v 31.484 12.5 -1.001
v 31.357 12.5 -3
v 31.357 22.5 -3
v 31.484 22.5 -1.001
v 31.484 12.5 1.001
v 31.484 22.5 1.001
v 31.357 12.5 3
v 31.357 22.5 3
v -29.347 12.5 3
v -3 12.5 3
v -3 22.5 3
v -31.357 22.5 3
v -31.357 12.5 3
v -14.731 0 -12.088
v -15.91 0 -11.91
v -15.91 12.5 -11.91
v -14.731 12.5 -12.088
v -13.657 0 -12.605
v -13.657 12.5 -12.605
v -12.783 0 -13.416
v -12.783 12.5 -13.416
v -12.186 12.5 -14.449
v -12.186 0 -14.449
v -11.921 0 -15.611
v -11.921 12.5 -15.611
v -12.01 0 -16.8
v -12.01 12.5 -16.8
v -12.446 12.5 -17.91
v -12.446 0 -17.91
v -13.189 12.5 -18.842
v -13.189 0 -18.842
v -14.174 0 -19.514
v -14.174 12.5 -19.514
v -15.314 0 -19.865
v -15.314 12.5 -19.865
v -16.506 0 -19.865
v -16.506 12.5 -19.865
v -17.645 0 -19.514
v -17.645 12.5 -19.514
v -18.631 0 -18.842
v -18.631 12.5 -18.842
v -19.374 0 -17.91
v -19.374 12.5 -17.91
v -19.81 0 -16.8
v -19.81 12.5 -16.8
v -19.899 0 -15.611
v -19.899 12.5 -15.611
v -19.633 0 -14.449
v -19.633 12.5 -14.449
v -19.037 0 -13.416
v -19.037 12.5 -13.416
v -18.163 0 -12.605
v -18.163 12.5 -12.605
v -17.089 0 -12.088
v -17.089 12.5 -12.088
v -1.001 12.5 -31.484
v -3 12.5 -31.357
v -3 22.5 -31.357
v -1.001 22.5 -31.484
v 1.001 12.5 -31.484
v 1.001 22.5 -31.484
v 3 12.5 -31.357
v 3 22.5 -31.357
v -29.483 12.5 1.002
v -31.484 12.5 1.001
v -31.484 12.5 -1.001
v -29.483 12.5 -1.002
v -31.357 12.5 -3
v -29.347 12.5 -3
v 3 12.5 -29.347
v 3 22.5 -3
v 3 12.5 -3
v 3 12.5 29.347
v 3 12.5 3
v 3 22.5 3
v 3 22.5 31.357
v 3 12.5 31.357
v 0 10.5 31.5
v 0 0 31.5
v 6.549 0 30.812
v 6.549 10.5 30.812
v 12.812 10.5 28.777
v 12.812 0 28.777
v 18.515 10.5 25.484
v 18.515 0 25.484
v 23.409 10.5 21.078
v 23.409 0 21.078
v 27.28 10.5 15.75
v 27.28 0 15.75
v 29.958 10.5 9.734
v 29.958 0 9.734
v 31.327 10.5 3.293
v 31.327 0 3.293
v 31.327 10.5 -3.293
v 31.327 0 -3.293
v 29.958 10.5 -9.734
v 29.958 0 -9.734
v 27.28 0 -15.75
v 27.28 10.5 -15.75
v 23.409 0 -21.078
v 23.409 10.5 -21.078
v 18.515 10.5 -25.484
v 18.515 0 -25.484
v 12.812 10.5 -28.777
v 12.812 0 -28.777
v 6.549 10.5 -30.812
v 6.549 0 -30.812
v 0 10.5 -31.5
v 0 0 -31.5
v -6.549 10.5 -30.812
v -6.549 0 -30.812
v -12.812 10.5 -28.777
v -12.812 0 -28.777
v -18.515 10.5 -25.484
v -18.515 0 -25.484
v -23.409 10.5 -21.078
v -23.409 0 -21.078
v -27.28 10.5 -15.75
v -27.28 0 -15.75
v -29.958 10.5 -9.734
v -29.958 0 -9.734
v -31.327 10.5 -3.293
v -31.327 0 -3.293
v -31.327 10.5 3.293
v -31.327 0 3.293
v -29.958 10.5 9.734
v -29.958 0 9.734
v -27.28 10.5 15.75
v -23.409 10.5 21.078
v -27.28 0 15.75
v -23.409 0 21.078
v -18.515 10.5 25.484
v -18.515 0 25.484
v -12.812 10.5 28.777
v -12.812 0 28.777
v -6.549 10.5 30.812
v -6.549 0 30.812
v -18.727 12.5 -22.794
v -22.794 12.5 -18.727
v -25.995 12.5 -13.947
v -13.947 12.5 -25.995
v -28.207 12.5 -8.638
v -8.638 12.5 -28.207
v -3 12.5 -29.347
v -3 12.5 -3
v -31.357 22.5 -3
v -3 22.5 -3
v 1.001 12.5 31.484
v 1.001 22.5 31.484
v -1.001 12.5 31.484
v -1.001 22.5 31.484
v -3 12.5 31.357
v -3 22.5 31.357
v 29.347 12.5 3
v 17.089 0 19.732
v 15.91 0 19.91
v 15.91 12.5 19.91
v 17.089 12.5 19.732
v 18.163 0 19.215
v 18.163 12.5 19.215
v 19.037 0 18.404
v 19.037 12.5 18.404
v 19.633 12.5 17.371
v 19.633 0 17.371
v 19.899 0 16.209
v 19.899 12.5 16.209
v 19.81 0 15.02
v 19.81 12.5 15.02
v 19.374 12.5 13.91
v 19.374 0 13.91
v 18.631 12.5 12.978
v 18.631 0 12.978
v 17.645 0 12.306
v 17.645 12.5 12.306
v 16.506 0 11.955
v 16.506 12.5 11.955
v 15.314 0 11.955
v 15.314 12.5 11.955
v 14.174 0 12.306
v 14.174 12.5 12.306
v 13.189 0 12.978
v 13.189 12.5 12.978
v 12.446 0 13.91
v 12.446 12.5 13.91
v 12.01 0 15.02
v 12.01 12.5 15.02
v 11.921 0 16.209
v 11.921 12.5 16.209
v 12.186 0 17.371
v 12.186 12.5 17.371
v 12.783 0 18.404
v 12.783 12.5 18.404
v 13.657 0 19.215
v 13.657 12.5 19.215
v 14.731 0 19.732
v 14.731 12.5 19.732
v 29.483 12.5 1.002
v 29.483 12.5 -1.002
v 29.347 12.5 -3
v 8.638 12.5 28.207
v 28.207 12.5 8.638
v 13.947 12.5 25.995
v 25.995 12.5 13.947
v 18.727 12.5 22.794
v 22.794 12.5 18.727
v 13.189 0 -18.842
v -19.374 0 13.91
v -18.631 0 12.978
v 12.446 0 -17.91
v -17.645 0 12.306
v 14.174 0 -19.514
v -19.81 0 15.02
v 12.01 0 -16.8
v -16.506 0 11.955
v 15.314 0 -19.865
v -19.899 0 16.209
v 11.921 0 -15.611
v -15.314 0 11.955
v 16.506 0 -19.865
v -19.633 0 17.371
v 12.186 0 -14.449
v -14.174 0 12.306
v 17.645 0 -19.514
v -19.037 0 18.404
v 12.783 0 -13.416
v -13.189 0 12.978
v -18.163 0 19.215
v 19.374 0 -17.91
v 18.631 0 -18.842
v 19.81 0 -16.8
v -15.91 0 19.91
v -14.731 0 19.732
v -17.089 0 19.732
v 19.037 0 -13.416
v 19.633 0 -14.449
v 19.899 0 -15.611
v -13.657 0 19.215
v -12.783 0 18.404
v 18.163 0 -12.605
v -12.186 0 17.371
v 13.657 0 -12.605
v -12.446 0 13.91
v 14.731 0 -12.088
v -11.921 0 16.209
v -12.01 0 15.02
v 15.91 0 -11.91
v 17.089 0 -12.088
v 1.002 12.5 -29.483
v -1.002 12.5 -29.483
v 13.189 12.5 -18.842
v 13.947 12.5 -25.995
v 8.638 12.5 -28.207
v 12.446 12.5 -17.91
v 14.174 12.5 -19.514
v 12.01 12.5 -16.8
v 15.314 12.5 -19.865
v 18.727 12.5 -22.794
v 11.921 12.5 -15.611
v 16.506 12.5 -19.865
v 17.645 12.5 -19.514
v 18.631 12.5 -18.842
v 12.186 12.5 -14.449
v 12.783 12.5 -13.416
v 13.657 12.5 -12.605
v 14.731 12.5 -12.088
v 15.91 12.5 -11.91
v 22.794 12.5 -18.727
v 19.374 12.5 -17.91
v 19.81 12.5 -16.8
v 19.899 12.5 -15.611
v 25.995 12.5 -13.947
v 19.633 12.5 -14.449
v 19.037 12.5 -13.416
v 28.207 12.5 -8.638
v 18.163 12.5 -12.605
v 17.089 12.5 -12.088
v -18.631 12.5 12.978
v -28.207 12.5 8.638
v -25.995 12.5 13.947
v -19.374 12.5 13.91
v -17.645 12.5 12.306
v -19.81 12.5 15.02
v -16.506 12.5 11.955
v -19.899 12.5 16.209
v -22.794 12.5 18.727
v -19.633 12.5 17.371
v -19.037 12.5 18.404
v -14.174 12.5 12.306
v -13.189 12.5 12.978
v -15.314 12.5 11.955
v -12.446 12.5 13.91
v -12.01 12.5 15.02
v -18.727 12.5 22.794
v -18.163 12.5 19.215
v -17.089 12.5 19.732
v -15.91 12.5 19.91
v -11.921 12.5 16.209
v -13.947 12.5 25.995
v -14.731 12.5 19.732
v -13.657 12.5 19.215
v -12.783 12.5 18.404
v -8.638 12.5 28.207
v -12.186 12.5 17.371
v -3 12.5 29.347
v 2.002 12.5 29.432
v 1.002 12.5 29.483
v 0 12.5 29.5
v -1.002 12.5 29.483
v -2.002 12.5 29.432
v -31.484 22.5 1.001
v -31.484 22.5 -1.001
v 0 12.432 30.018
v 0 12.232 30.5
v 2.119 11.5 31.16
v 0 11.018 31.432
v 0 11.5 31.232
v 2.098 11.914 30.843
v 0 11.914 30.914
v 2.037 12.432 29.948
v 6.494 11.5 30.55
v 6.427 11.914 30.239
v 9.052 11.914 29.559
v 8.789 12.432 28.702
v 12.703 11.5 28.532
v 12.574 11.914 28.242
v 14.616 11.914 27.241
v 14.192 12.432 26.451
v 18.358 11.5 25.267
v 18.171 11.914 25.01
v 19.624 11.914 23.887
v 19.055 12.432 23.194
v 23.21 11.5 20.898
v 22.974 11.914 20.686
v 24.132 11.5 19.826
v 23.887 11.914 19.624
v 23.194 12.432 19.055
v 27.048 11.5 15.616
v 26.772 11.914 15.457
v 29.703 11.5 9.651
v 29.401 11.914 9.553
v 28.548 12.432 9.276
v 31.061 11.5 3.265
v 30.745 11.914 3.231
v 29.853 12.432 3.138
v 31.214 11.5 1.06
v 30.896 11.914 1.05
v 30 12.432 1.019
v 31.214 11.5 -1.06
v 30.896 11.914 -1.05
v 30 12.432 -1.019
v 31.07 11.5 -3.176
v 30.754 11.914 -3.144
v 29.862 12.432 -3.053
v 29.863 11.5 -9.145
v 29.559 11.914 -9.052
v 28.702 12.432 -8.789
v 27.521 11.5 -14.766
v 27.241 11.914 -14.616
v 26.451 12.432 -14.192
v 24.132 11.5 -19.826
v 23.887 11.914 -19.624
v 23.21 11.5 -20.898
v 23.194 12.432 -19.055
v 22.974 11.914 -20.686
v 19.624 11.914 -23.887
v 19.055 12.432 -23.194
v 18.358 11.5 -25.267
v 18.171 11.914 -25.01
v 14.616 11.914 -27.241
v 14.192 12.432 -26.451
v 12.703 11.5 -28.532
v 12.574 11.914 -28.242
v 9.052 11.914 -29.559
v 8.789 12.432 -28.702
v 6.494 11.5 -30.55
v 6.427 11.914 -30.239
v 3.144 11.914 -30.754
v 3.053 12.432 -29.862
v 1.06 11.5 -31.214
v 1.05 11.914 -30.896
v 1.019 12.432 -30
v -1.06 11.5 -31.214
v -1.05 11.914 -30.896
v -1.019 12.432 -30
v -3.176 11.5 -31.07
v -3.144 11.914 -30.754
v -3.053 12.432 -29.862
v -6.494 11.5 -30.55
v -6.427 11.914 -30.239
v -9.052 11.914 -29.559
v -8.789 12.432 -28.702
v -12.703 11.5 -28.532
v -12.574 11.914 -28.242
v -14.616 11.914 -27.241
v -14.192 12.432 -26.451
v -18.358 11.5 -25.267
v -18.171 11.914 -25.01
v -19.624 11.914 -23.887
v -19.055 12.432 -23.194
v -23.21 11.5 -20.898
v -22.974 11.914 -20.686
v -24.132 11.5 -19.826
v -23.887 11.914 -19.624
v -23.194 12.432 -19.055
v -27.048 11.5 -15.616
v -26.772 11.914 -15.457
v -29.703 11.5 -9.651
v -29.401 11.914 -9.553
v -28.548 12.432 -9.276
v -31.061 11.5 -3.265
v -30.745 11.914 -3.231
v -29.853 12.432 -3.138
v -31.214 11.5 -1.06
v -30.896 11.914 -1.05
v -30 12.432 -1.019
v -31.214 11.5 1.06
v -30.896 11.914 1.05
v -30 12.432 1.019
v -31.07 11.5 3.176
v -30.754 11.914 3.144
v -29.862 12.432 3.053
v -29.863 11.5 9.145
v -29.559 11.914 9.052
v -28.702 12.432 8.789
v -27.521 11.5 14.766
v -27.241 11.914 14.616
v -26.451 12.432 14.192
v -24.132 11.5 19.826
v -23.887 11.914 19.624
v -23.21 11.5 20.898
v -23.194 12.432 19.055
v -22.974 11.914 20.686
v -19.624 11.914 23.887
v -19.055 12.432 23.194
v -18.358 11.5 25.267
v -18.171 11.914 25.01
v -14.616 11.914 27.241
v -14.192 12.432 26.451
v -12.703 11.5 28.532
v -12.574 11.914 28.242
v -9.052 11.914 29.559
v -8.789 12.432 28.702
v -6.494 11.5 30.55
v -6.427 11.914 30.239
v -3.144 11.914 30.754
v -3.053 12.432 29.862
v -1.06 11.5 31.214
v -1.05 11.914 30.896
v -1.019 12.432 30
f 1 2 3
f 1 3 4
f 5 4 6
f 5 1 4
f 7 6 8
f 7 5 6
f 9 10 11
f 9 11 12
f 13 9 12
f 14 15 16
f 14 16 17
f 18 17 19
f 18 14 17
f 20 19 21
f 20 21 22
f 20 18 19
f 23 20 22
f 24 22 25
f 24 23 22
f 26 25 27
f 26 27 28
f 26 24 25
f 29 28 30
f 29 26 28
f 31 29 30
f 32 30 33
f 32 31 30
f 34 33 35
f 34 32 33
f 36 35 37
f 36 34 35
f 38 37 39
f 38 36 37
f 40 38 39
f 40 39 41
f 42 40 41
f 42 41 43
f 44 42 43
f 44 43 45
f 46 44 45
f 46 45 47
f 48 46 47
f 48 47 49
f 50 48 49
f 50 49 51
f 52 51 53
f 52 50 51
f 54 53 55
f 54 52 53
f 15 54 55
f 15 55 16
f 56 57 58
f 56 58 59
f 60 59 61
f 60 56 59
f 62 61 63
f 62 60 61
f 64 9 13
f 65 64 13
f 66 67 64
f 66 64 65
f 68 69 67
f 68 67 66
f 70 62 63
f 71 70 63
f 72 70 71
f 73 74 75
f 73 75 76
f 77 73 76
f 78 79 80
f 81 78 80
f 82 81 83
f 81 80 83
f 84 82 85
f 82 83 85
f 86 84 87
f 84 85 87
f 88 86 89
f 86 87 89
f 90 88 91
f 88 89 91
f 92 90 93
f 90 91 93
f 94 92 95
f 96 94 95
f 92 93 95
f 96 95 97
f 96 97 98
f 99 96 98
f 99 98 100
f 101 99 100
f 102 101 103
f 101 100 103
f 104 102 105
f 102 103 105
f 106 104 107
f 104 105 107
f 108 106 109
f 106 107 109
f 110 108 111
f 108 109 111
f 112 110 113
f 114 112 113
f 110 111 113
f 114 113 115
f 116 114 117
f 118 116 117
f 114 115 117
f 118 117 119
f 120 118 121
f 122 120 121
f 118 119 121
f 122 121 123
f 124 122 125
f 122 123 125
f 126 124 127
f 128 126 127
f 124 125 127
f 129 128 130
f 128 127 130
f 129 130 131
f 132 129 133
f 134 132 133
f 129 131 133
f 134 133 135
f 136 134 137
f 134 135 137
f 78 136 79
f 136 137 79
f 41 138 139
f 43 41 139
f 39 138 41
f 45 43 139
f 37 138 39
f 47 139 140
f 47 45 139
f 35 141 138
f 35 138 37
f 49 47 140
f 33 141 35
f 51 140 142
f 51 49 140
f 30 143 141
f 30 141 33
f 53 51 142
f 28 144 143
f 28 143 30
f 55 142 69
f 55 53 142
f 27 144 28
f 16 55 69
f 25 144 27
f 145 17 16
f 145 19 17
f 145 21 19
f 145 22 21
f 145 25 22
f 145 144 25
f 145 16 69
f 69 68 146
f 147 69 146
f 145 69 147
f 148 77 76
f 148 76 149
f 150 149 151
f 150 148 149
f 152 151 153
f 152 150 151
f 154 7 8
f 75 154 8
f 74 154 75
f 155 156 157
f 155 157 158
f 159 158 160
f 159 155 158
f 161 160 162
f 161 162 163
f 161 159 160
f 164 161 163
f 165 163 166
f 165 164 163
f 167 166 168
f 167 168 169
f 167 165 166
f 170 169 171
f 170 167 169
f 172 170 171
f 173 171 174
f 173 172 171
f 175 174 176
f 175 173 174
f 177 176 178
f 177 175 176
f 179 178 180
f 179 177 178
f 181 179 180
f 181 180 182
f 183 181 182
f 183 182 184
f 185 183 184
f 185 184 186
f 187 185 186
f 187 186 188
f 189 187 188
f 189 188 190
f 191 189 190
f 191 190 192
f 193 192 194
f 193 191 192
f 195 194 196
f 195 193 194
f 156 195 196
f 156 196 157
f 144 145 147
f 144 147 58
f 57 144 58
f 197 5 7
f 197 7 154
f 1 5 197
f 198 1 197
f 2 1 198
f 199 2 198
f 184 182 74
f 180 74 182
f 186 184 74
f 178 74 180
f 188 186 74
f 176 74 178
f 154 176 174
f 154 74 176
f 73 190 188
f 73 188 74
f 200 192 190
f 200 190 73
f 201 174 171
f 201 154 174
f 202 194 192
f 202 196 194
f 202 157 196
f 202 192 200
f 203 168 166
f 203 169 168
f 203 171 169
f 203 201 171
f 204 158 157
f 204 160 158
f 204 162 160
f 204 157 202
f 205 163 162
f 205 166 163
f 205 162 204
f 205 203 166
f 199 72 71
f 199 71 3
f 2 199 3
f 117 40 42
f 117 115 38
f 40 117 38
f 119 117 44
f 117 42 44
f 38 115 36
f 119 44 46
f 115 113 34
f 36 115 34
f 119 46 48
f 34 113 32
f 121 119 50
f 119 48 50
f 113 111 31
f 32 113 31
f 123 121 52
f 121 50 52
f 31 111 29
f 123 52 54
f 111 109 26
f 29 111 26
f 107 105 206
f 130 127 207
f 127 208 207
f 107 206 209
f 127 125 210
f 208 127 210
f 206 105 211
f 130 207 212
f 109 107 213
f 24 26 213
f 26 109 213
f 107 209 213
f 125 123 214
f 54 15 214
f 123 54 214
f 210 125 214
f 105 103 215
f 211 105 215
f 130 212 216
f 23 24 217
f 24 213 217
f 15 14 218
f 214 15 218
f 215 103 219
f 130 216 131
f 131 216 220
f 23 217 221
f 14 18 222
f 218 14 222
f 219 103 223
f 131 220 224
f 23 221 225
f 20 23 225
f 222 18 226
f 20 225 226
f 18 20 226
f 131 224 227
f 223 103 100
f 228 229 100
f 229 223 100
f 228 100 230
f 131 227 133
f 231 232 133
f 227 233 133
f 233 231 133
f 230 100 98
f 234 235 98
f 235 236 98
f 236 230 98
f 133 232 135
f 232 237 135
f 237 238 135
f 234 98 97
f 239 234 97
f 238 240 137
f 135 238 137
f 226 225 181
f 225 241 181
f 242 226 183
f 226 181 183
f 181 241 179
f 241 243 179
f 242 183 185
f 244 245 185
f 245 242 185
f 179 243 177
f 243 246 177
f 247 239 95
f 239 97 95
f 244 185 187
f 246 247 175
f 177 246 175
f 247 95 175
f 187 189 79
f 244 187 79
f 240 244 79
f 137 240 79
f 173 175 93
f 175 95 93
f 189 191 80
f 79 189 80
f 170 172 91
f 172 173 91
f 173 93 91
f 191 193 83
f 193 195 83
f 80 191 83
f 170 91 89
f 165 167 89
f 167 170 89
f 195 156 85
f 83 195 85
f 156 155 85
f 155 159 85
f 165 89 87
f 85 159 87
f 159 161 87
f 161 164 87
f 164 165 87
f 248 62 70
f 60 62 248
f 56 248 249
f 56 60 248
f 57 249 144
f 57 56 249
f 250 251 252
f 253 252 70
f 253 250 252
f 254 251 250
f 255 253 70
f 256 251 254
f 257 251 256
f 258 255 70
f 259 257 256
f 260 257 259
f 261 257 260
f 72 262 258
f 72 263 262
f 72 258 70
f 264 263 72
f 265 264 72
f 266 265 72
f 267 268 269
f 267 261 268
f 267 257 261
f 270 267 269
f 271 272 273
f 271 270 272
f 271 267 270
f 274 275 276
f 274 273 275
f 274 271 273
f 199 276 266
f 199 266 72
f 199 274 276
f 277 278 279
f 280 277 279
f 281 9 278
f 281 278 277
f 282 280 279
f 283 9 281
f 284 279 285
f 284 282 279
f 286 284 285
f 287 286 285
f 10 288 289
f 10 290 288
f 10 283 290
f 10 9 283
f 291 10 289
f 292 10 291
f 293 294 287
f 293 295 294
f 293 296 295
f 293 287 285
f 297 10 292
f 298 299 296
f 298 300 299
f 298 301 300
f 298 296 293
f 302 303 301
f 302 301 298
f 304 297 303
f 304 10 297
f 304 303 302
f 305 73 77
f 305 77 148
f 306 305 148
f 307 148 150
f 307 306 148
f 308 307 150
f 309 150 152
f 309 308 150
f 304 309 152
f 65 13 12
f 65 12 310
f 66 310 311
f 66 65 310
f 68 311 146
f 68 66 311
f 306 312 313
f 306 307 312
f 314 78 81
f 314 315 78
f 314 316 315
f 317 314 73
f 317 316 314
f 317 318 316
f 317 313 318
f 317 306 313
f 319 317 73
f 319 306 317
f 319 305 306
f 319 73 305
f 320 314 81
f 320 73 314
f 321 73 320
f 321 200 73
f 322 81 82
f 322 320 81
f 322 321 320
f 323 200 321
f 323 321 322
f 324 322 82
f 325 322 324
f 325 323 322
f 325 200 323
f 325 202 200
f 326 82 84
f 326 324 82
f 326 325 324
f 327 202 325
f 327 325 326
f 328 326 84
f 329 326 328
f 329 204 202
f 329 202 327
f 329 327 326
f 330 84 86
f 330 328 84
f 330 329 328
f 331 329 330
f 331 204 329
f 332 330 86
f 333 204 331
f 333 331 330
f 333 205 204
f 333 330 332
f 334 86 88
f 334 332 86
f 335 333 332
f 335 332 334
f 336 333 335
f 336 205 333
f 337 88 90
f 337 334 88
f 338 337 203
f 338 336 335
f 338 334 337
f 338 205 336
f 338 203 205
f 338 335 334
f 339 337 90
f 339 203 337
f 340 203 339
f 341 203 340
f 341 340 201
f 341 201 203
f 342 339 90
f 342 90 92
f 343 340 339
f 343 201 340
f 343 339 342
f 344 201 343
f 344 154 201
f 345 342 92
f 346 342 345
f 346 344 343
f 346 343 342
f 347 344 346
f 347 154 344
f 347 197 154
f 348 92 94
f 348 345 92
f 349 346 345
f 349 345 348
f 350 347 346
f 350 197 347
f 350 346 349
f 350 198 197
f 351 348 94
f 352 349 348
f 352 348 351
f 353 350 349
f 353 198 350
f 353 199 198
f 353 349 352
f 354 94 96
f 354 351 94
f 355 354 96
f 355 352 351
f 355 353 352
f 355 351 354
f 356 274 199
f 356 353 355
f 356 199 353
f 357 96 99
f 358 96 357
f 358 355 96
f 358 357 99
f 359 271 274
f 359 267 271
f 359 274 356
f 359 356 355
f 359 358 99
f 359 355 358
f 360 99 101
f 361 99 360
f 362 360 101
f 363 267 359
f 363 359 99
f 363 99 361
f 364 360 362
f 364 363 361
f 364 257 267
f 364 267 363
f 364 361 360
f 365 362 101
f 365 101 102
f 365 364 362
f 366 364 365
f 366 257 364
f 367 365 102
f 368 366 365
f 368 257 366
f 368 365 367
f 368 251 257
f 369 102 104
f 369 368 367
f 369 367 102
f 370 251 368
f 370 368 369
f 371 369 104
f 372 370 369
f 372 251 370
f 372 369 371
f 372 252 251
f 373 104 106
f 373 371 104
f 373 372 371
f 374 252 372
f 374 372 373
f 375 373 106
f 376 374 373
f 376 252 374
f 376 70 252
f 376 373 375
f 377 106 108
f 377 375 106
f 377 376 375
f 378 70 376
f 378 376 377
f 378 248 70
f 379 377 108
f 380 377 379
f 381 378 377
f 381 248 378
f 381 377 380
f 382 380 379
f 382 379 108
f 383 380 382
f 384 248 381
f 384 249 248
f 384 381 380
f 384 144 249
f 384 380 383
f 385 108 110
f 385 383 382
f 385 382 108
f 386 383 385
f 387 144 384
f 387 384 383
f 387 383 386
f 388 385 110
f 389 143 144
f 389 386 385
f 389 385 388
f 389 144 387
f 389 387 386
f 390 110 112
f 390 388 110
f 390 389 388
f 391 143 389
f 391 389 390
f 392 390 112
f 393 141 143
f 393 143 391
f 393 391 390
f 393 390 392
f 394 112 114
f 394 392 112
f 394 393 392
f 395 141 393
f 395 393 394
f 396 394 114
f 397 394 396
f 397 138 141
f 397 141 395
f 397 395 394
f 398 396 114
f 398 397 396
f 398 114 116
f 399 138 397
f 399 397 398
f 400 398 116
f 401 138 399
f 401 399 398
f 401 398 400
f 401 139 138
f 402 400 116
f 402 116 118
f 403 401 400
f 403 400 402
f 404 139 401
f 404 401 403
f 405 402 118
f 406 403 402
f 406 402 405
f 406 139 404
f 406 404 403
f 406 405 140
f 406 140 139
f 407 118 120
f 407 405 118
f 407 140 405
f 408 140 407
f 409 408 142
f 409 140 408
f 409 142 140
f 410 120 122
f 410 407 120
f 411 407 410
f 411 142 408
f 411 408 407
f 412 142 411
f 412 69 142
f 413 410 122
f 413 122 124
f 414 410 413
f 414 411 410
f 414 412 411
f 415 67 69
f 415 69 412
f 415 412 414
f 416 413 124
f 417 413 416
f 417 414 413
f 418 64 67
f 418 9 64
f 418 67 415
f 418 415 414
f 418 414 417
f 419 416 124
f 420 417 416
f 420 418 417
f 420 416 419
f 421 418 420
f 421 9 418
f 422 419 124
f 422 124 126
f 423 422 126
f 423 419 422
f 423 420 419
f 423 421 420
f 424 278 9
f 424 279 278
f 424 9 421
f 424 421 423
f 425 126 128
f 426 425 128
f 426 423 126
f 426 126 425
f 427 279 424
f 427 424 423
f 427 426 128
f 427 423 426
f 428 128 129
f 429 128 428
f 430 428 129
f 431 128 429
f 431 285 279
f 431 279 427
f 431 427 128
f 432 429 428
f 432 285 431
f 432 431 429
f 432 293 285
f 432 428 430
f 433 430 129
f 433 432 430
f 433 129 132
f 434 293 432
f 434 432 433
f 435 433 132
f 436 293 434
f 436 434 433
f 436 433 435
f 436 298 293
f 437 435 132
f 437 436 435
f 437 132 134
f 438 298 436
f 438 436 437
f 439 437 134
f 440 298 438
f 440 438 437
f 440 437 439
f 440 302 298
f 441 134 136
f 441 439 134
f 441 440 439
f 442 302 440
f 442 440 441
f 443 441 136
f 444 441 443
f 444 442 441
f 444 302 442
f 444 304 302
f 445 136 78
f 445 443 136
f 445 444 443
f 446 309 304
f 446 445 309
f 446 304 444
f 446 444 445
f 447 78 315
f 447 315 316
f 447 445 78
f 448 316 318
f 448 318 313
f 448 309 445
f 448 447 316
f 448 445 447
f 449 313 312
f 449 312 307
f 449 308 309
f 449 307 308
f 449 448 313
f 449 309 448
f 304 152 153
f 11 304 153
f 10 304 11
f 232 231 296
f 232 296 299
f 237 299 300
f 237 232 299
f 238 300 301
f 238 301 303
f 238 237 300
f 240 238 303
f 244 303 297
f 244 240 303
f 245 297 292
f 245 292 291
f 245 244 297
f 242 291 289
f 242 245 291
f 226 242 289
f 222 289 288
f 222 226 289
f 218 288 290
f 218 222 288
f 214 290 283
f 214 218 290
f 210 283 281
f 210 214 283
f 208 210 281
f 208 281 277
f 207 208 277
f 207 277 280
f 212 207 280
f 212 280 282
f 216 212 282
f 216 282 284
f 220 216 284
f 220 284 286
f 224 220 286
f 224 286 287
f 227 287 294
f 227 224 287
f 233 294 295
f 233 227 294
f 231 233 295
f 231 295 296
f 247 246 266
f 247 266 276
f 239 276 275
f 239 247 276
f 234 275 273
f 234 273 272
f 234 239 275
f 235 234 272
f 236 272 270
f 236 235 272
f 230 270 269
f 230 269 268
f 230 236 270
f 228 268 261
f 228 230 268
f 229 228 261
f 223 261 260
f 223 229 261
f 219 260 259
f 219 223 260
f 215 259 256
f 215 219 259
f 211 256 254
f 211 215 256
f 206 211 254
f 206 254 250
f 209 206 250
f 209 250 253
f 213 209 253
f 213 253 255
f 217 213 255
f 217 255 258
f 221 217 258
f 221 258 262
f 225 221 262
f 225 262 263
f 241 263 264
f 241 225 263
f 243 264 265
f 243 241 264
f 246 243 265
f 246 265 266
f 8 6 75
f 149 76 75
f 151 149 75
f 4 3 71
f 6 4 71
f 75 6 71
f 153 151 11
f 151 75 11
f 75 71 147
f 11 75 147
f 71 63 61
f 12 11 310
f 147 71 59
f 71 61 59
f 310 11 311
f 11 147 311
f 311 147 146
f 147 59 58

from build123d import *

# Parameters (mm, degrees)
SKETCH_1_R      = 31.5
SKETCH_1_R_2    = 4
EXTRUDE_1_DEPTH = 12.5
FILLET_1_R      = 2
EXTRUDE_2_DEPTH = 10


with BuildPart() as part:
    # 草图1 → 凸台-拉伸1 (new body)
    with BuildSketch(Plane(origin=(0, 0, 0), x_dir=(1, 0, 0), z_dir=(0, 1, 0))):
        with Locations(Location((0, 0, 0), (0, 0, 270))):
            Circle(SKETCH_1_R)
        with Locations(Location((-15.909902577, 15.909902577, 0), (0, 0, 270))):
            Circle(SKETCH_1_R_2, mode=Mode.SUBTRACT)
        with Locations(Location((15.909902577, 15.909902577, 0), (0, 0, 270))):
            Circle(SKETCH_1_R_2, mode=Mode.SUBTRACT)
        with Locations(Location((15.909902577, -15.909902577, 0), (0, 0, 270))):
            Circle(SKETCH_1_R_2, mode=Mode.SUBTRACT)
        with Locations(Location((-15.909902577, -15.909902577, 0), (0, 0, 270))):
            Circle(SKETCH_1_R_2, mode=Mode.SUBTRACT)
    extrude(amount=EXTRUDE_1_DEPTH)

    # 圆角1
    fillet_1_edges = [part.edges().sort_by_distance(p)[0] for p in [
        (0, 12.5, -31.5),
    ]]
    fillet(fillet_1_edges, radius=FILLET_1_R)

    # 草图2 → 凸台-拉伸2 (add)
    with BuildSketch(Plane(origin=(0, 12.5, 0), x_dir=(1, 0, 0), z_dir=(0, 1, 0))):
        with BuildLine():
            Line((3, 31.356817441), (3, 3))
            Line((3, 3), (31.356817441, 3))
            ThreePointArc((31.356817441, 3), (31.5, 0), (31.356817441, -3))
            Line((31.356817441, -3), (3, -3))
            Line((3, -3), (3, -31.356817441))
            ThreePointArc((3, -31.356817441), (0, -31.5), (-3, -31.356817441))
            Line((-3, -31.356817441), (-3, -3))
            Line((-3, -3), (-31.356817441, -3))
            ThreePointArc((-31.356817441, -3), (-31.5, 0), (-31.356817441, 3))
            Line((-31.356817441, 3), (-3, 3))
            Line((-3, 3), (-3, 31.356817441))
            ThreePointArc((-3, 31.356817441), (0, 31.5), (3, 31.356817441))
        make_face()
    extrude(amount=EXTRUDE_2_DEPTH)


solid = part.part
